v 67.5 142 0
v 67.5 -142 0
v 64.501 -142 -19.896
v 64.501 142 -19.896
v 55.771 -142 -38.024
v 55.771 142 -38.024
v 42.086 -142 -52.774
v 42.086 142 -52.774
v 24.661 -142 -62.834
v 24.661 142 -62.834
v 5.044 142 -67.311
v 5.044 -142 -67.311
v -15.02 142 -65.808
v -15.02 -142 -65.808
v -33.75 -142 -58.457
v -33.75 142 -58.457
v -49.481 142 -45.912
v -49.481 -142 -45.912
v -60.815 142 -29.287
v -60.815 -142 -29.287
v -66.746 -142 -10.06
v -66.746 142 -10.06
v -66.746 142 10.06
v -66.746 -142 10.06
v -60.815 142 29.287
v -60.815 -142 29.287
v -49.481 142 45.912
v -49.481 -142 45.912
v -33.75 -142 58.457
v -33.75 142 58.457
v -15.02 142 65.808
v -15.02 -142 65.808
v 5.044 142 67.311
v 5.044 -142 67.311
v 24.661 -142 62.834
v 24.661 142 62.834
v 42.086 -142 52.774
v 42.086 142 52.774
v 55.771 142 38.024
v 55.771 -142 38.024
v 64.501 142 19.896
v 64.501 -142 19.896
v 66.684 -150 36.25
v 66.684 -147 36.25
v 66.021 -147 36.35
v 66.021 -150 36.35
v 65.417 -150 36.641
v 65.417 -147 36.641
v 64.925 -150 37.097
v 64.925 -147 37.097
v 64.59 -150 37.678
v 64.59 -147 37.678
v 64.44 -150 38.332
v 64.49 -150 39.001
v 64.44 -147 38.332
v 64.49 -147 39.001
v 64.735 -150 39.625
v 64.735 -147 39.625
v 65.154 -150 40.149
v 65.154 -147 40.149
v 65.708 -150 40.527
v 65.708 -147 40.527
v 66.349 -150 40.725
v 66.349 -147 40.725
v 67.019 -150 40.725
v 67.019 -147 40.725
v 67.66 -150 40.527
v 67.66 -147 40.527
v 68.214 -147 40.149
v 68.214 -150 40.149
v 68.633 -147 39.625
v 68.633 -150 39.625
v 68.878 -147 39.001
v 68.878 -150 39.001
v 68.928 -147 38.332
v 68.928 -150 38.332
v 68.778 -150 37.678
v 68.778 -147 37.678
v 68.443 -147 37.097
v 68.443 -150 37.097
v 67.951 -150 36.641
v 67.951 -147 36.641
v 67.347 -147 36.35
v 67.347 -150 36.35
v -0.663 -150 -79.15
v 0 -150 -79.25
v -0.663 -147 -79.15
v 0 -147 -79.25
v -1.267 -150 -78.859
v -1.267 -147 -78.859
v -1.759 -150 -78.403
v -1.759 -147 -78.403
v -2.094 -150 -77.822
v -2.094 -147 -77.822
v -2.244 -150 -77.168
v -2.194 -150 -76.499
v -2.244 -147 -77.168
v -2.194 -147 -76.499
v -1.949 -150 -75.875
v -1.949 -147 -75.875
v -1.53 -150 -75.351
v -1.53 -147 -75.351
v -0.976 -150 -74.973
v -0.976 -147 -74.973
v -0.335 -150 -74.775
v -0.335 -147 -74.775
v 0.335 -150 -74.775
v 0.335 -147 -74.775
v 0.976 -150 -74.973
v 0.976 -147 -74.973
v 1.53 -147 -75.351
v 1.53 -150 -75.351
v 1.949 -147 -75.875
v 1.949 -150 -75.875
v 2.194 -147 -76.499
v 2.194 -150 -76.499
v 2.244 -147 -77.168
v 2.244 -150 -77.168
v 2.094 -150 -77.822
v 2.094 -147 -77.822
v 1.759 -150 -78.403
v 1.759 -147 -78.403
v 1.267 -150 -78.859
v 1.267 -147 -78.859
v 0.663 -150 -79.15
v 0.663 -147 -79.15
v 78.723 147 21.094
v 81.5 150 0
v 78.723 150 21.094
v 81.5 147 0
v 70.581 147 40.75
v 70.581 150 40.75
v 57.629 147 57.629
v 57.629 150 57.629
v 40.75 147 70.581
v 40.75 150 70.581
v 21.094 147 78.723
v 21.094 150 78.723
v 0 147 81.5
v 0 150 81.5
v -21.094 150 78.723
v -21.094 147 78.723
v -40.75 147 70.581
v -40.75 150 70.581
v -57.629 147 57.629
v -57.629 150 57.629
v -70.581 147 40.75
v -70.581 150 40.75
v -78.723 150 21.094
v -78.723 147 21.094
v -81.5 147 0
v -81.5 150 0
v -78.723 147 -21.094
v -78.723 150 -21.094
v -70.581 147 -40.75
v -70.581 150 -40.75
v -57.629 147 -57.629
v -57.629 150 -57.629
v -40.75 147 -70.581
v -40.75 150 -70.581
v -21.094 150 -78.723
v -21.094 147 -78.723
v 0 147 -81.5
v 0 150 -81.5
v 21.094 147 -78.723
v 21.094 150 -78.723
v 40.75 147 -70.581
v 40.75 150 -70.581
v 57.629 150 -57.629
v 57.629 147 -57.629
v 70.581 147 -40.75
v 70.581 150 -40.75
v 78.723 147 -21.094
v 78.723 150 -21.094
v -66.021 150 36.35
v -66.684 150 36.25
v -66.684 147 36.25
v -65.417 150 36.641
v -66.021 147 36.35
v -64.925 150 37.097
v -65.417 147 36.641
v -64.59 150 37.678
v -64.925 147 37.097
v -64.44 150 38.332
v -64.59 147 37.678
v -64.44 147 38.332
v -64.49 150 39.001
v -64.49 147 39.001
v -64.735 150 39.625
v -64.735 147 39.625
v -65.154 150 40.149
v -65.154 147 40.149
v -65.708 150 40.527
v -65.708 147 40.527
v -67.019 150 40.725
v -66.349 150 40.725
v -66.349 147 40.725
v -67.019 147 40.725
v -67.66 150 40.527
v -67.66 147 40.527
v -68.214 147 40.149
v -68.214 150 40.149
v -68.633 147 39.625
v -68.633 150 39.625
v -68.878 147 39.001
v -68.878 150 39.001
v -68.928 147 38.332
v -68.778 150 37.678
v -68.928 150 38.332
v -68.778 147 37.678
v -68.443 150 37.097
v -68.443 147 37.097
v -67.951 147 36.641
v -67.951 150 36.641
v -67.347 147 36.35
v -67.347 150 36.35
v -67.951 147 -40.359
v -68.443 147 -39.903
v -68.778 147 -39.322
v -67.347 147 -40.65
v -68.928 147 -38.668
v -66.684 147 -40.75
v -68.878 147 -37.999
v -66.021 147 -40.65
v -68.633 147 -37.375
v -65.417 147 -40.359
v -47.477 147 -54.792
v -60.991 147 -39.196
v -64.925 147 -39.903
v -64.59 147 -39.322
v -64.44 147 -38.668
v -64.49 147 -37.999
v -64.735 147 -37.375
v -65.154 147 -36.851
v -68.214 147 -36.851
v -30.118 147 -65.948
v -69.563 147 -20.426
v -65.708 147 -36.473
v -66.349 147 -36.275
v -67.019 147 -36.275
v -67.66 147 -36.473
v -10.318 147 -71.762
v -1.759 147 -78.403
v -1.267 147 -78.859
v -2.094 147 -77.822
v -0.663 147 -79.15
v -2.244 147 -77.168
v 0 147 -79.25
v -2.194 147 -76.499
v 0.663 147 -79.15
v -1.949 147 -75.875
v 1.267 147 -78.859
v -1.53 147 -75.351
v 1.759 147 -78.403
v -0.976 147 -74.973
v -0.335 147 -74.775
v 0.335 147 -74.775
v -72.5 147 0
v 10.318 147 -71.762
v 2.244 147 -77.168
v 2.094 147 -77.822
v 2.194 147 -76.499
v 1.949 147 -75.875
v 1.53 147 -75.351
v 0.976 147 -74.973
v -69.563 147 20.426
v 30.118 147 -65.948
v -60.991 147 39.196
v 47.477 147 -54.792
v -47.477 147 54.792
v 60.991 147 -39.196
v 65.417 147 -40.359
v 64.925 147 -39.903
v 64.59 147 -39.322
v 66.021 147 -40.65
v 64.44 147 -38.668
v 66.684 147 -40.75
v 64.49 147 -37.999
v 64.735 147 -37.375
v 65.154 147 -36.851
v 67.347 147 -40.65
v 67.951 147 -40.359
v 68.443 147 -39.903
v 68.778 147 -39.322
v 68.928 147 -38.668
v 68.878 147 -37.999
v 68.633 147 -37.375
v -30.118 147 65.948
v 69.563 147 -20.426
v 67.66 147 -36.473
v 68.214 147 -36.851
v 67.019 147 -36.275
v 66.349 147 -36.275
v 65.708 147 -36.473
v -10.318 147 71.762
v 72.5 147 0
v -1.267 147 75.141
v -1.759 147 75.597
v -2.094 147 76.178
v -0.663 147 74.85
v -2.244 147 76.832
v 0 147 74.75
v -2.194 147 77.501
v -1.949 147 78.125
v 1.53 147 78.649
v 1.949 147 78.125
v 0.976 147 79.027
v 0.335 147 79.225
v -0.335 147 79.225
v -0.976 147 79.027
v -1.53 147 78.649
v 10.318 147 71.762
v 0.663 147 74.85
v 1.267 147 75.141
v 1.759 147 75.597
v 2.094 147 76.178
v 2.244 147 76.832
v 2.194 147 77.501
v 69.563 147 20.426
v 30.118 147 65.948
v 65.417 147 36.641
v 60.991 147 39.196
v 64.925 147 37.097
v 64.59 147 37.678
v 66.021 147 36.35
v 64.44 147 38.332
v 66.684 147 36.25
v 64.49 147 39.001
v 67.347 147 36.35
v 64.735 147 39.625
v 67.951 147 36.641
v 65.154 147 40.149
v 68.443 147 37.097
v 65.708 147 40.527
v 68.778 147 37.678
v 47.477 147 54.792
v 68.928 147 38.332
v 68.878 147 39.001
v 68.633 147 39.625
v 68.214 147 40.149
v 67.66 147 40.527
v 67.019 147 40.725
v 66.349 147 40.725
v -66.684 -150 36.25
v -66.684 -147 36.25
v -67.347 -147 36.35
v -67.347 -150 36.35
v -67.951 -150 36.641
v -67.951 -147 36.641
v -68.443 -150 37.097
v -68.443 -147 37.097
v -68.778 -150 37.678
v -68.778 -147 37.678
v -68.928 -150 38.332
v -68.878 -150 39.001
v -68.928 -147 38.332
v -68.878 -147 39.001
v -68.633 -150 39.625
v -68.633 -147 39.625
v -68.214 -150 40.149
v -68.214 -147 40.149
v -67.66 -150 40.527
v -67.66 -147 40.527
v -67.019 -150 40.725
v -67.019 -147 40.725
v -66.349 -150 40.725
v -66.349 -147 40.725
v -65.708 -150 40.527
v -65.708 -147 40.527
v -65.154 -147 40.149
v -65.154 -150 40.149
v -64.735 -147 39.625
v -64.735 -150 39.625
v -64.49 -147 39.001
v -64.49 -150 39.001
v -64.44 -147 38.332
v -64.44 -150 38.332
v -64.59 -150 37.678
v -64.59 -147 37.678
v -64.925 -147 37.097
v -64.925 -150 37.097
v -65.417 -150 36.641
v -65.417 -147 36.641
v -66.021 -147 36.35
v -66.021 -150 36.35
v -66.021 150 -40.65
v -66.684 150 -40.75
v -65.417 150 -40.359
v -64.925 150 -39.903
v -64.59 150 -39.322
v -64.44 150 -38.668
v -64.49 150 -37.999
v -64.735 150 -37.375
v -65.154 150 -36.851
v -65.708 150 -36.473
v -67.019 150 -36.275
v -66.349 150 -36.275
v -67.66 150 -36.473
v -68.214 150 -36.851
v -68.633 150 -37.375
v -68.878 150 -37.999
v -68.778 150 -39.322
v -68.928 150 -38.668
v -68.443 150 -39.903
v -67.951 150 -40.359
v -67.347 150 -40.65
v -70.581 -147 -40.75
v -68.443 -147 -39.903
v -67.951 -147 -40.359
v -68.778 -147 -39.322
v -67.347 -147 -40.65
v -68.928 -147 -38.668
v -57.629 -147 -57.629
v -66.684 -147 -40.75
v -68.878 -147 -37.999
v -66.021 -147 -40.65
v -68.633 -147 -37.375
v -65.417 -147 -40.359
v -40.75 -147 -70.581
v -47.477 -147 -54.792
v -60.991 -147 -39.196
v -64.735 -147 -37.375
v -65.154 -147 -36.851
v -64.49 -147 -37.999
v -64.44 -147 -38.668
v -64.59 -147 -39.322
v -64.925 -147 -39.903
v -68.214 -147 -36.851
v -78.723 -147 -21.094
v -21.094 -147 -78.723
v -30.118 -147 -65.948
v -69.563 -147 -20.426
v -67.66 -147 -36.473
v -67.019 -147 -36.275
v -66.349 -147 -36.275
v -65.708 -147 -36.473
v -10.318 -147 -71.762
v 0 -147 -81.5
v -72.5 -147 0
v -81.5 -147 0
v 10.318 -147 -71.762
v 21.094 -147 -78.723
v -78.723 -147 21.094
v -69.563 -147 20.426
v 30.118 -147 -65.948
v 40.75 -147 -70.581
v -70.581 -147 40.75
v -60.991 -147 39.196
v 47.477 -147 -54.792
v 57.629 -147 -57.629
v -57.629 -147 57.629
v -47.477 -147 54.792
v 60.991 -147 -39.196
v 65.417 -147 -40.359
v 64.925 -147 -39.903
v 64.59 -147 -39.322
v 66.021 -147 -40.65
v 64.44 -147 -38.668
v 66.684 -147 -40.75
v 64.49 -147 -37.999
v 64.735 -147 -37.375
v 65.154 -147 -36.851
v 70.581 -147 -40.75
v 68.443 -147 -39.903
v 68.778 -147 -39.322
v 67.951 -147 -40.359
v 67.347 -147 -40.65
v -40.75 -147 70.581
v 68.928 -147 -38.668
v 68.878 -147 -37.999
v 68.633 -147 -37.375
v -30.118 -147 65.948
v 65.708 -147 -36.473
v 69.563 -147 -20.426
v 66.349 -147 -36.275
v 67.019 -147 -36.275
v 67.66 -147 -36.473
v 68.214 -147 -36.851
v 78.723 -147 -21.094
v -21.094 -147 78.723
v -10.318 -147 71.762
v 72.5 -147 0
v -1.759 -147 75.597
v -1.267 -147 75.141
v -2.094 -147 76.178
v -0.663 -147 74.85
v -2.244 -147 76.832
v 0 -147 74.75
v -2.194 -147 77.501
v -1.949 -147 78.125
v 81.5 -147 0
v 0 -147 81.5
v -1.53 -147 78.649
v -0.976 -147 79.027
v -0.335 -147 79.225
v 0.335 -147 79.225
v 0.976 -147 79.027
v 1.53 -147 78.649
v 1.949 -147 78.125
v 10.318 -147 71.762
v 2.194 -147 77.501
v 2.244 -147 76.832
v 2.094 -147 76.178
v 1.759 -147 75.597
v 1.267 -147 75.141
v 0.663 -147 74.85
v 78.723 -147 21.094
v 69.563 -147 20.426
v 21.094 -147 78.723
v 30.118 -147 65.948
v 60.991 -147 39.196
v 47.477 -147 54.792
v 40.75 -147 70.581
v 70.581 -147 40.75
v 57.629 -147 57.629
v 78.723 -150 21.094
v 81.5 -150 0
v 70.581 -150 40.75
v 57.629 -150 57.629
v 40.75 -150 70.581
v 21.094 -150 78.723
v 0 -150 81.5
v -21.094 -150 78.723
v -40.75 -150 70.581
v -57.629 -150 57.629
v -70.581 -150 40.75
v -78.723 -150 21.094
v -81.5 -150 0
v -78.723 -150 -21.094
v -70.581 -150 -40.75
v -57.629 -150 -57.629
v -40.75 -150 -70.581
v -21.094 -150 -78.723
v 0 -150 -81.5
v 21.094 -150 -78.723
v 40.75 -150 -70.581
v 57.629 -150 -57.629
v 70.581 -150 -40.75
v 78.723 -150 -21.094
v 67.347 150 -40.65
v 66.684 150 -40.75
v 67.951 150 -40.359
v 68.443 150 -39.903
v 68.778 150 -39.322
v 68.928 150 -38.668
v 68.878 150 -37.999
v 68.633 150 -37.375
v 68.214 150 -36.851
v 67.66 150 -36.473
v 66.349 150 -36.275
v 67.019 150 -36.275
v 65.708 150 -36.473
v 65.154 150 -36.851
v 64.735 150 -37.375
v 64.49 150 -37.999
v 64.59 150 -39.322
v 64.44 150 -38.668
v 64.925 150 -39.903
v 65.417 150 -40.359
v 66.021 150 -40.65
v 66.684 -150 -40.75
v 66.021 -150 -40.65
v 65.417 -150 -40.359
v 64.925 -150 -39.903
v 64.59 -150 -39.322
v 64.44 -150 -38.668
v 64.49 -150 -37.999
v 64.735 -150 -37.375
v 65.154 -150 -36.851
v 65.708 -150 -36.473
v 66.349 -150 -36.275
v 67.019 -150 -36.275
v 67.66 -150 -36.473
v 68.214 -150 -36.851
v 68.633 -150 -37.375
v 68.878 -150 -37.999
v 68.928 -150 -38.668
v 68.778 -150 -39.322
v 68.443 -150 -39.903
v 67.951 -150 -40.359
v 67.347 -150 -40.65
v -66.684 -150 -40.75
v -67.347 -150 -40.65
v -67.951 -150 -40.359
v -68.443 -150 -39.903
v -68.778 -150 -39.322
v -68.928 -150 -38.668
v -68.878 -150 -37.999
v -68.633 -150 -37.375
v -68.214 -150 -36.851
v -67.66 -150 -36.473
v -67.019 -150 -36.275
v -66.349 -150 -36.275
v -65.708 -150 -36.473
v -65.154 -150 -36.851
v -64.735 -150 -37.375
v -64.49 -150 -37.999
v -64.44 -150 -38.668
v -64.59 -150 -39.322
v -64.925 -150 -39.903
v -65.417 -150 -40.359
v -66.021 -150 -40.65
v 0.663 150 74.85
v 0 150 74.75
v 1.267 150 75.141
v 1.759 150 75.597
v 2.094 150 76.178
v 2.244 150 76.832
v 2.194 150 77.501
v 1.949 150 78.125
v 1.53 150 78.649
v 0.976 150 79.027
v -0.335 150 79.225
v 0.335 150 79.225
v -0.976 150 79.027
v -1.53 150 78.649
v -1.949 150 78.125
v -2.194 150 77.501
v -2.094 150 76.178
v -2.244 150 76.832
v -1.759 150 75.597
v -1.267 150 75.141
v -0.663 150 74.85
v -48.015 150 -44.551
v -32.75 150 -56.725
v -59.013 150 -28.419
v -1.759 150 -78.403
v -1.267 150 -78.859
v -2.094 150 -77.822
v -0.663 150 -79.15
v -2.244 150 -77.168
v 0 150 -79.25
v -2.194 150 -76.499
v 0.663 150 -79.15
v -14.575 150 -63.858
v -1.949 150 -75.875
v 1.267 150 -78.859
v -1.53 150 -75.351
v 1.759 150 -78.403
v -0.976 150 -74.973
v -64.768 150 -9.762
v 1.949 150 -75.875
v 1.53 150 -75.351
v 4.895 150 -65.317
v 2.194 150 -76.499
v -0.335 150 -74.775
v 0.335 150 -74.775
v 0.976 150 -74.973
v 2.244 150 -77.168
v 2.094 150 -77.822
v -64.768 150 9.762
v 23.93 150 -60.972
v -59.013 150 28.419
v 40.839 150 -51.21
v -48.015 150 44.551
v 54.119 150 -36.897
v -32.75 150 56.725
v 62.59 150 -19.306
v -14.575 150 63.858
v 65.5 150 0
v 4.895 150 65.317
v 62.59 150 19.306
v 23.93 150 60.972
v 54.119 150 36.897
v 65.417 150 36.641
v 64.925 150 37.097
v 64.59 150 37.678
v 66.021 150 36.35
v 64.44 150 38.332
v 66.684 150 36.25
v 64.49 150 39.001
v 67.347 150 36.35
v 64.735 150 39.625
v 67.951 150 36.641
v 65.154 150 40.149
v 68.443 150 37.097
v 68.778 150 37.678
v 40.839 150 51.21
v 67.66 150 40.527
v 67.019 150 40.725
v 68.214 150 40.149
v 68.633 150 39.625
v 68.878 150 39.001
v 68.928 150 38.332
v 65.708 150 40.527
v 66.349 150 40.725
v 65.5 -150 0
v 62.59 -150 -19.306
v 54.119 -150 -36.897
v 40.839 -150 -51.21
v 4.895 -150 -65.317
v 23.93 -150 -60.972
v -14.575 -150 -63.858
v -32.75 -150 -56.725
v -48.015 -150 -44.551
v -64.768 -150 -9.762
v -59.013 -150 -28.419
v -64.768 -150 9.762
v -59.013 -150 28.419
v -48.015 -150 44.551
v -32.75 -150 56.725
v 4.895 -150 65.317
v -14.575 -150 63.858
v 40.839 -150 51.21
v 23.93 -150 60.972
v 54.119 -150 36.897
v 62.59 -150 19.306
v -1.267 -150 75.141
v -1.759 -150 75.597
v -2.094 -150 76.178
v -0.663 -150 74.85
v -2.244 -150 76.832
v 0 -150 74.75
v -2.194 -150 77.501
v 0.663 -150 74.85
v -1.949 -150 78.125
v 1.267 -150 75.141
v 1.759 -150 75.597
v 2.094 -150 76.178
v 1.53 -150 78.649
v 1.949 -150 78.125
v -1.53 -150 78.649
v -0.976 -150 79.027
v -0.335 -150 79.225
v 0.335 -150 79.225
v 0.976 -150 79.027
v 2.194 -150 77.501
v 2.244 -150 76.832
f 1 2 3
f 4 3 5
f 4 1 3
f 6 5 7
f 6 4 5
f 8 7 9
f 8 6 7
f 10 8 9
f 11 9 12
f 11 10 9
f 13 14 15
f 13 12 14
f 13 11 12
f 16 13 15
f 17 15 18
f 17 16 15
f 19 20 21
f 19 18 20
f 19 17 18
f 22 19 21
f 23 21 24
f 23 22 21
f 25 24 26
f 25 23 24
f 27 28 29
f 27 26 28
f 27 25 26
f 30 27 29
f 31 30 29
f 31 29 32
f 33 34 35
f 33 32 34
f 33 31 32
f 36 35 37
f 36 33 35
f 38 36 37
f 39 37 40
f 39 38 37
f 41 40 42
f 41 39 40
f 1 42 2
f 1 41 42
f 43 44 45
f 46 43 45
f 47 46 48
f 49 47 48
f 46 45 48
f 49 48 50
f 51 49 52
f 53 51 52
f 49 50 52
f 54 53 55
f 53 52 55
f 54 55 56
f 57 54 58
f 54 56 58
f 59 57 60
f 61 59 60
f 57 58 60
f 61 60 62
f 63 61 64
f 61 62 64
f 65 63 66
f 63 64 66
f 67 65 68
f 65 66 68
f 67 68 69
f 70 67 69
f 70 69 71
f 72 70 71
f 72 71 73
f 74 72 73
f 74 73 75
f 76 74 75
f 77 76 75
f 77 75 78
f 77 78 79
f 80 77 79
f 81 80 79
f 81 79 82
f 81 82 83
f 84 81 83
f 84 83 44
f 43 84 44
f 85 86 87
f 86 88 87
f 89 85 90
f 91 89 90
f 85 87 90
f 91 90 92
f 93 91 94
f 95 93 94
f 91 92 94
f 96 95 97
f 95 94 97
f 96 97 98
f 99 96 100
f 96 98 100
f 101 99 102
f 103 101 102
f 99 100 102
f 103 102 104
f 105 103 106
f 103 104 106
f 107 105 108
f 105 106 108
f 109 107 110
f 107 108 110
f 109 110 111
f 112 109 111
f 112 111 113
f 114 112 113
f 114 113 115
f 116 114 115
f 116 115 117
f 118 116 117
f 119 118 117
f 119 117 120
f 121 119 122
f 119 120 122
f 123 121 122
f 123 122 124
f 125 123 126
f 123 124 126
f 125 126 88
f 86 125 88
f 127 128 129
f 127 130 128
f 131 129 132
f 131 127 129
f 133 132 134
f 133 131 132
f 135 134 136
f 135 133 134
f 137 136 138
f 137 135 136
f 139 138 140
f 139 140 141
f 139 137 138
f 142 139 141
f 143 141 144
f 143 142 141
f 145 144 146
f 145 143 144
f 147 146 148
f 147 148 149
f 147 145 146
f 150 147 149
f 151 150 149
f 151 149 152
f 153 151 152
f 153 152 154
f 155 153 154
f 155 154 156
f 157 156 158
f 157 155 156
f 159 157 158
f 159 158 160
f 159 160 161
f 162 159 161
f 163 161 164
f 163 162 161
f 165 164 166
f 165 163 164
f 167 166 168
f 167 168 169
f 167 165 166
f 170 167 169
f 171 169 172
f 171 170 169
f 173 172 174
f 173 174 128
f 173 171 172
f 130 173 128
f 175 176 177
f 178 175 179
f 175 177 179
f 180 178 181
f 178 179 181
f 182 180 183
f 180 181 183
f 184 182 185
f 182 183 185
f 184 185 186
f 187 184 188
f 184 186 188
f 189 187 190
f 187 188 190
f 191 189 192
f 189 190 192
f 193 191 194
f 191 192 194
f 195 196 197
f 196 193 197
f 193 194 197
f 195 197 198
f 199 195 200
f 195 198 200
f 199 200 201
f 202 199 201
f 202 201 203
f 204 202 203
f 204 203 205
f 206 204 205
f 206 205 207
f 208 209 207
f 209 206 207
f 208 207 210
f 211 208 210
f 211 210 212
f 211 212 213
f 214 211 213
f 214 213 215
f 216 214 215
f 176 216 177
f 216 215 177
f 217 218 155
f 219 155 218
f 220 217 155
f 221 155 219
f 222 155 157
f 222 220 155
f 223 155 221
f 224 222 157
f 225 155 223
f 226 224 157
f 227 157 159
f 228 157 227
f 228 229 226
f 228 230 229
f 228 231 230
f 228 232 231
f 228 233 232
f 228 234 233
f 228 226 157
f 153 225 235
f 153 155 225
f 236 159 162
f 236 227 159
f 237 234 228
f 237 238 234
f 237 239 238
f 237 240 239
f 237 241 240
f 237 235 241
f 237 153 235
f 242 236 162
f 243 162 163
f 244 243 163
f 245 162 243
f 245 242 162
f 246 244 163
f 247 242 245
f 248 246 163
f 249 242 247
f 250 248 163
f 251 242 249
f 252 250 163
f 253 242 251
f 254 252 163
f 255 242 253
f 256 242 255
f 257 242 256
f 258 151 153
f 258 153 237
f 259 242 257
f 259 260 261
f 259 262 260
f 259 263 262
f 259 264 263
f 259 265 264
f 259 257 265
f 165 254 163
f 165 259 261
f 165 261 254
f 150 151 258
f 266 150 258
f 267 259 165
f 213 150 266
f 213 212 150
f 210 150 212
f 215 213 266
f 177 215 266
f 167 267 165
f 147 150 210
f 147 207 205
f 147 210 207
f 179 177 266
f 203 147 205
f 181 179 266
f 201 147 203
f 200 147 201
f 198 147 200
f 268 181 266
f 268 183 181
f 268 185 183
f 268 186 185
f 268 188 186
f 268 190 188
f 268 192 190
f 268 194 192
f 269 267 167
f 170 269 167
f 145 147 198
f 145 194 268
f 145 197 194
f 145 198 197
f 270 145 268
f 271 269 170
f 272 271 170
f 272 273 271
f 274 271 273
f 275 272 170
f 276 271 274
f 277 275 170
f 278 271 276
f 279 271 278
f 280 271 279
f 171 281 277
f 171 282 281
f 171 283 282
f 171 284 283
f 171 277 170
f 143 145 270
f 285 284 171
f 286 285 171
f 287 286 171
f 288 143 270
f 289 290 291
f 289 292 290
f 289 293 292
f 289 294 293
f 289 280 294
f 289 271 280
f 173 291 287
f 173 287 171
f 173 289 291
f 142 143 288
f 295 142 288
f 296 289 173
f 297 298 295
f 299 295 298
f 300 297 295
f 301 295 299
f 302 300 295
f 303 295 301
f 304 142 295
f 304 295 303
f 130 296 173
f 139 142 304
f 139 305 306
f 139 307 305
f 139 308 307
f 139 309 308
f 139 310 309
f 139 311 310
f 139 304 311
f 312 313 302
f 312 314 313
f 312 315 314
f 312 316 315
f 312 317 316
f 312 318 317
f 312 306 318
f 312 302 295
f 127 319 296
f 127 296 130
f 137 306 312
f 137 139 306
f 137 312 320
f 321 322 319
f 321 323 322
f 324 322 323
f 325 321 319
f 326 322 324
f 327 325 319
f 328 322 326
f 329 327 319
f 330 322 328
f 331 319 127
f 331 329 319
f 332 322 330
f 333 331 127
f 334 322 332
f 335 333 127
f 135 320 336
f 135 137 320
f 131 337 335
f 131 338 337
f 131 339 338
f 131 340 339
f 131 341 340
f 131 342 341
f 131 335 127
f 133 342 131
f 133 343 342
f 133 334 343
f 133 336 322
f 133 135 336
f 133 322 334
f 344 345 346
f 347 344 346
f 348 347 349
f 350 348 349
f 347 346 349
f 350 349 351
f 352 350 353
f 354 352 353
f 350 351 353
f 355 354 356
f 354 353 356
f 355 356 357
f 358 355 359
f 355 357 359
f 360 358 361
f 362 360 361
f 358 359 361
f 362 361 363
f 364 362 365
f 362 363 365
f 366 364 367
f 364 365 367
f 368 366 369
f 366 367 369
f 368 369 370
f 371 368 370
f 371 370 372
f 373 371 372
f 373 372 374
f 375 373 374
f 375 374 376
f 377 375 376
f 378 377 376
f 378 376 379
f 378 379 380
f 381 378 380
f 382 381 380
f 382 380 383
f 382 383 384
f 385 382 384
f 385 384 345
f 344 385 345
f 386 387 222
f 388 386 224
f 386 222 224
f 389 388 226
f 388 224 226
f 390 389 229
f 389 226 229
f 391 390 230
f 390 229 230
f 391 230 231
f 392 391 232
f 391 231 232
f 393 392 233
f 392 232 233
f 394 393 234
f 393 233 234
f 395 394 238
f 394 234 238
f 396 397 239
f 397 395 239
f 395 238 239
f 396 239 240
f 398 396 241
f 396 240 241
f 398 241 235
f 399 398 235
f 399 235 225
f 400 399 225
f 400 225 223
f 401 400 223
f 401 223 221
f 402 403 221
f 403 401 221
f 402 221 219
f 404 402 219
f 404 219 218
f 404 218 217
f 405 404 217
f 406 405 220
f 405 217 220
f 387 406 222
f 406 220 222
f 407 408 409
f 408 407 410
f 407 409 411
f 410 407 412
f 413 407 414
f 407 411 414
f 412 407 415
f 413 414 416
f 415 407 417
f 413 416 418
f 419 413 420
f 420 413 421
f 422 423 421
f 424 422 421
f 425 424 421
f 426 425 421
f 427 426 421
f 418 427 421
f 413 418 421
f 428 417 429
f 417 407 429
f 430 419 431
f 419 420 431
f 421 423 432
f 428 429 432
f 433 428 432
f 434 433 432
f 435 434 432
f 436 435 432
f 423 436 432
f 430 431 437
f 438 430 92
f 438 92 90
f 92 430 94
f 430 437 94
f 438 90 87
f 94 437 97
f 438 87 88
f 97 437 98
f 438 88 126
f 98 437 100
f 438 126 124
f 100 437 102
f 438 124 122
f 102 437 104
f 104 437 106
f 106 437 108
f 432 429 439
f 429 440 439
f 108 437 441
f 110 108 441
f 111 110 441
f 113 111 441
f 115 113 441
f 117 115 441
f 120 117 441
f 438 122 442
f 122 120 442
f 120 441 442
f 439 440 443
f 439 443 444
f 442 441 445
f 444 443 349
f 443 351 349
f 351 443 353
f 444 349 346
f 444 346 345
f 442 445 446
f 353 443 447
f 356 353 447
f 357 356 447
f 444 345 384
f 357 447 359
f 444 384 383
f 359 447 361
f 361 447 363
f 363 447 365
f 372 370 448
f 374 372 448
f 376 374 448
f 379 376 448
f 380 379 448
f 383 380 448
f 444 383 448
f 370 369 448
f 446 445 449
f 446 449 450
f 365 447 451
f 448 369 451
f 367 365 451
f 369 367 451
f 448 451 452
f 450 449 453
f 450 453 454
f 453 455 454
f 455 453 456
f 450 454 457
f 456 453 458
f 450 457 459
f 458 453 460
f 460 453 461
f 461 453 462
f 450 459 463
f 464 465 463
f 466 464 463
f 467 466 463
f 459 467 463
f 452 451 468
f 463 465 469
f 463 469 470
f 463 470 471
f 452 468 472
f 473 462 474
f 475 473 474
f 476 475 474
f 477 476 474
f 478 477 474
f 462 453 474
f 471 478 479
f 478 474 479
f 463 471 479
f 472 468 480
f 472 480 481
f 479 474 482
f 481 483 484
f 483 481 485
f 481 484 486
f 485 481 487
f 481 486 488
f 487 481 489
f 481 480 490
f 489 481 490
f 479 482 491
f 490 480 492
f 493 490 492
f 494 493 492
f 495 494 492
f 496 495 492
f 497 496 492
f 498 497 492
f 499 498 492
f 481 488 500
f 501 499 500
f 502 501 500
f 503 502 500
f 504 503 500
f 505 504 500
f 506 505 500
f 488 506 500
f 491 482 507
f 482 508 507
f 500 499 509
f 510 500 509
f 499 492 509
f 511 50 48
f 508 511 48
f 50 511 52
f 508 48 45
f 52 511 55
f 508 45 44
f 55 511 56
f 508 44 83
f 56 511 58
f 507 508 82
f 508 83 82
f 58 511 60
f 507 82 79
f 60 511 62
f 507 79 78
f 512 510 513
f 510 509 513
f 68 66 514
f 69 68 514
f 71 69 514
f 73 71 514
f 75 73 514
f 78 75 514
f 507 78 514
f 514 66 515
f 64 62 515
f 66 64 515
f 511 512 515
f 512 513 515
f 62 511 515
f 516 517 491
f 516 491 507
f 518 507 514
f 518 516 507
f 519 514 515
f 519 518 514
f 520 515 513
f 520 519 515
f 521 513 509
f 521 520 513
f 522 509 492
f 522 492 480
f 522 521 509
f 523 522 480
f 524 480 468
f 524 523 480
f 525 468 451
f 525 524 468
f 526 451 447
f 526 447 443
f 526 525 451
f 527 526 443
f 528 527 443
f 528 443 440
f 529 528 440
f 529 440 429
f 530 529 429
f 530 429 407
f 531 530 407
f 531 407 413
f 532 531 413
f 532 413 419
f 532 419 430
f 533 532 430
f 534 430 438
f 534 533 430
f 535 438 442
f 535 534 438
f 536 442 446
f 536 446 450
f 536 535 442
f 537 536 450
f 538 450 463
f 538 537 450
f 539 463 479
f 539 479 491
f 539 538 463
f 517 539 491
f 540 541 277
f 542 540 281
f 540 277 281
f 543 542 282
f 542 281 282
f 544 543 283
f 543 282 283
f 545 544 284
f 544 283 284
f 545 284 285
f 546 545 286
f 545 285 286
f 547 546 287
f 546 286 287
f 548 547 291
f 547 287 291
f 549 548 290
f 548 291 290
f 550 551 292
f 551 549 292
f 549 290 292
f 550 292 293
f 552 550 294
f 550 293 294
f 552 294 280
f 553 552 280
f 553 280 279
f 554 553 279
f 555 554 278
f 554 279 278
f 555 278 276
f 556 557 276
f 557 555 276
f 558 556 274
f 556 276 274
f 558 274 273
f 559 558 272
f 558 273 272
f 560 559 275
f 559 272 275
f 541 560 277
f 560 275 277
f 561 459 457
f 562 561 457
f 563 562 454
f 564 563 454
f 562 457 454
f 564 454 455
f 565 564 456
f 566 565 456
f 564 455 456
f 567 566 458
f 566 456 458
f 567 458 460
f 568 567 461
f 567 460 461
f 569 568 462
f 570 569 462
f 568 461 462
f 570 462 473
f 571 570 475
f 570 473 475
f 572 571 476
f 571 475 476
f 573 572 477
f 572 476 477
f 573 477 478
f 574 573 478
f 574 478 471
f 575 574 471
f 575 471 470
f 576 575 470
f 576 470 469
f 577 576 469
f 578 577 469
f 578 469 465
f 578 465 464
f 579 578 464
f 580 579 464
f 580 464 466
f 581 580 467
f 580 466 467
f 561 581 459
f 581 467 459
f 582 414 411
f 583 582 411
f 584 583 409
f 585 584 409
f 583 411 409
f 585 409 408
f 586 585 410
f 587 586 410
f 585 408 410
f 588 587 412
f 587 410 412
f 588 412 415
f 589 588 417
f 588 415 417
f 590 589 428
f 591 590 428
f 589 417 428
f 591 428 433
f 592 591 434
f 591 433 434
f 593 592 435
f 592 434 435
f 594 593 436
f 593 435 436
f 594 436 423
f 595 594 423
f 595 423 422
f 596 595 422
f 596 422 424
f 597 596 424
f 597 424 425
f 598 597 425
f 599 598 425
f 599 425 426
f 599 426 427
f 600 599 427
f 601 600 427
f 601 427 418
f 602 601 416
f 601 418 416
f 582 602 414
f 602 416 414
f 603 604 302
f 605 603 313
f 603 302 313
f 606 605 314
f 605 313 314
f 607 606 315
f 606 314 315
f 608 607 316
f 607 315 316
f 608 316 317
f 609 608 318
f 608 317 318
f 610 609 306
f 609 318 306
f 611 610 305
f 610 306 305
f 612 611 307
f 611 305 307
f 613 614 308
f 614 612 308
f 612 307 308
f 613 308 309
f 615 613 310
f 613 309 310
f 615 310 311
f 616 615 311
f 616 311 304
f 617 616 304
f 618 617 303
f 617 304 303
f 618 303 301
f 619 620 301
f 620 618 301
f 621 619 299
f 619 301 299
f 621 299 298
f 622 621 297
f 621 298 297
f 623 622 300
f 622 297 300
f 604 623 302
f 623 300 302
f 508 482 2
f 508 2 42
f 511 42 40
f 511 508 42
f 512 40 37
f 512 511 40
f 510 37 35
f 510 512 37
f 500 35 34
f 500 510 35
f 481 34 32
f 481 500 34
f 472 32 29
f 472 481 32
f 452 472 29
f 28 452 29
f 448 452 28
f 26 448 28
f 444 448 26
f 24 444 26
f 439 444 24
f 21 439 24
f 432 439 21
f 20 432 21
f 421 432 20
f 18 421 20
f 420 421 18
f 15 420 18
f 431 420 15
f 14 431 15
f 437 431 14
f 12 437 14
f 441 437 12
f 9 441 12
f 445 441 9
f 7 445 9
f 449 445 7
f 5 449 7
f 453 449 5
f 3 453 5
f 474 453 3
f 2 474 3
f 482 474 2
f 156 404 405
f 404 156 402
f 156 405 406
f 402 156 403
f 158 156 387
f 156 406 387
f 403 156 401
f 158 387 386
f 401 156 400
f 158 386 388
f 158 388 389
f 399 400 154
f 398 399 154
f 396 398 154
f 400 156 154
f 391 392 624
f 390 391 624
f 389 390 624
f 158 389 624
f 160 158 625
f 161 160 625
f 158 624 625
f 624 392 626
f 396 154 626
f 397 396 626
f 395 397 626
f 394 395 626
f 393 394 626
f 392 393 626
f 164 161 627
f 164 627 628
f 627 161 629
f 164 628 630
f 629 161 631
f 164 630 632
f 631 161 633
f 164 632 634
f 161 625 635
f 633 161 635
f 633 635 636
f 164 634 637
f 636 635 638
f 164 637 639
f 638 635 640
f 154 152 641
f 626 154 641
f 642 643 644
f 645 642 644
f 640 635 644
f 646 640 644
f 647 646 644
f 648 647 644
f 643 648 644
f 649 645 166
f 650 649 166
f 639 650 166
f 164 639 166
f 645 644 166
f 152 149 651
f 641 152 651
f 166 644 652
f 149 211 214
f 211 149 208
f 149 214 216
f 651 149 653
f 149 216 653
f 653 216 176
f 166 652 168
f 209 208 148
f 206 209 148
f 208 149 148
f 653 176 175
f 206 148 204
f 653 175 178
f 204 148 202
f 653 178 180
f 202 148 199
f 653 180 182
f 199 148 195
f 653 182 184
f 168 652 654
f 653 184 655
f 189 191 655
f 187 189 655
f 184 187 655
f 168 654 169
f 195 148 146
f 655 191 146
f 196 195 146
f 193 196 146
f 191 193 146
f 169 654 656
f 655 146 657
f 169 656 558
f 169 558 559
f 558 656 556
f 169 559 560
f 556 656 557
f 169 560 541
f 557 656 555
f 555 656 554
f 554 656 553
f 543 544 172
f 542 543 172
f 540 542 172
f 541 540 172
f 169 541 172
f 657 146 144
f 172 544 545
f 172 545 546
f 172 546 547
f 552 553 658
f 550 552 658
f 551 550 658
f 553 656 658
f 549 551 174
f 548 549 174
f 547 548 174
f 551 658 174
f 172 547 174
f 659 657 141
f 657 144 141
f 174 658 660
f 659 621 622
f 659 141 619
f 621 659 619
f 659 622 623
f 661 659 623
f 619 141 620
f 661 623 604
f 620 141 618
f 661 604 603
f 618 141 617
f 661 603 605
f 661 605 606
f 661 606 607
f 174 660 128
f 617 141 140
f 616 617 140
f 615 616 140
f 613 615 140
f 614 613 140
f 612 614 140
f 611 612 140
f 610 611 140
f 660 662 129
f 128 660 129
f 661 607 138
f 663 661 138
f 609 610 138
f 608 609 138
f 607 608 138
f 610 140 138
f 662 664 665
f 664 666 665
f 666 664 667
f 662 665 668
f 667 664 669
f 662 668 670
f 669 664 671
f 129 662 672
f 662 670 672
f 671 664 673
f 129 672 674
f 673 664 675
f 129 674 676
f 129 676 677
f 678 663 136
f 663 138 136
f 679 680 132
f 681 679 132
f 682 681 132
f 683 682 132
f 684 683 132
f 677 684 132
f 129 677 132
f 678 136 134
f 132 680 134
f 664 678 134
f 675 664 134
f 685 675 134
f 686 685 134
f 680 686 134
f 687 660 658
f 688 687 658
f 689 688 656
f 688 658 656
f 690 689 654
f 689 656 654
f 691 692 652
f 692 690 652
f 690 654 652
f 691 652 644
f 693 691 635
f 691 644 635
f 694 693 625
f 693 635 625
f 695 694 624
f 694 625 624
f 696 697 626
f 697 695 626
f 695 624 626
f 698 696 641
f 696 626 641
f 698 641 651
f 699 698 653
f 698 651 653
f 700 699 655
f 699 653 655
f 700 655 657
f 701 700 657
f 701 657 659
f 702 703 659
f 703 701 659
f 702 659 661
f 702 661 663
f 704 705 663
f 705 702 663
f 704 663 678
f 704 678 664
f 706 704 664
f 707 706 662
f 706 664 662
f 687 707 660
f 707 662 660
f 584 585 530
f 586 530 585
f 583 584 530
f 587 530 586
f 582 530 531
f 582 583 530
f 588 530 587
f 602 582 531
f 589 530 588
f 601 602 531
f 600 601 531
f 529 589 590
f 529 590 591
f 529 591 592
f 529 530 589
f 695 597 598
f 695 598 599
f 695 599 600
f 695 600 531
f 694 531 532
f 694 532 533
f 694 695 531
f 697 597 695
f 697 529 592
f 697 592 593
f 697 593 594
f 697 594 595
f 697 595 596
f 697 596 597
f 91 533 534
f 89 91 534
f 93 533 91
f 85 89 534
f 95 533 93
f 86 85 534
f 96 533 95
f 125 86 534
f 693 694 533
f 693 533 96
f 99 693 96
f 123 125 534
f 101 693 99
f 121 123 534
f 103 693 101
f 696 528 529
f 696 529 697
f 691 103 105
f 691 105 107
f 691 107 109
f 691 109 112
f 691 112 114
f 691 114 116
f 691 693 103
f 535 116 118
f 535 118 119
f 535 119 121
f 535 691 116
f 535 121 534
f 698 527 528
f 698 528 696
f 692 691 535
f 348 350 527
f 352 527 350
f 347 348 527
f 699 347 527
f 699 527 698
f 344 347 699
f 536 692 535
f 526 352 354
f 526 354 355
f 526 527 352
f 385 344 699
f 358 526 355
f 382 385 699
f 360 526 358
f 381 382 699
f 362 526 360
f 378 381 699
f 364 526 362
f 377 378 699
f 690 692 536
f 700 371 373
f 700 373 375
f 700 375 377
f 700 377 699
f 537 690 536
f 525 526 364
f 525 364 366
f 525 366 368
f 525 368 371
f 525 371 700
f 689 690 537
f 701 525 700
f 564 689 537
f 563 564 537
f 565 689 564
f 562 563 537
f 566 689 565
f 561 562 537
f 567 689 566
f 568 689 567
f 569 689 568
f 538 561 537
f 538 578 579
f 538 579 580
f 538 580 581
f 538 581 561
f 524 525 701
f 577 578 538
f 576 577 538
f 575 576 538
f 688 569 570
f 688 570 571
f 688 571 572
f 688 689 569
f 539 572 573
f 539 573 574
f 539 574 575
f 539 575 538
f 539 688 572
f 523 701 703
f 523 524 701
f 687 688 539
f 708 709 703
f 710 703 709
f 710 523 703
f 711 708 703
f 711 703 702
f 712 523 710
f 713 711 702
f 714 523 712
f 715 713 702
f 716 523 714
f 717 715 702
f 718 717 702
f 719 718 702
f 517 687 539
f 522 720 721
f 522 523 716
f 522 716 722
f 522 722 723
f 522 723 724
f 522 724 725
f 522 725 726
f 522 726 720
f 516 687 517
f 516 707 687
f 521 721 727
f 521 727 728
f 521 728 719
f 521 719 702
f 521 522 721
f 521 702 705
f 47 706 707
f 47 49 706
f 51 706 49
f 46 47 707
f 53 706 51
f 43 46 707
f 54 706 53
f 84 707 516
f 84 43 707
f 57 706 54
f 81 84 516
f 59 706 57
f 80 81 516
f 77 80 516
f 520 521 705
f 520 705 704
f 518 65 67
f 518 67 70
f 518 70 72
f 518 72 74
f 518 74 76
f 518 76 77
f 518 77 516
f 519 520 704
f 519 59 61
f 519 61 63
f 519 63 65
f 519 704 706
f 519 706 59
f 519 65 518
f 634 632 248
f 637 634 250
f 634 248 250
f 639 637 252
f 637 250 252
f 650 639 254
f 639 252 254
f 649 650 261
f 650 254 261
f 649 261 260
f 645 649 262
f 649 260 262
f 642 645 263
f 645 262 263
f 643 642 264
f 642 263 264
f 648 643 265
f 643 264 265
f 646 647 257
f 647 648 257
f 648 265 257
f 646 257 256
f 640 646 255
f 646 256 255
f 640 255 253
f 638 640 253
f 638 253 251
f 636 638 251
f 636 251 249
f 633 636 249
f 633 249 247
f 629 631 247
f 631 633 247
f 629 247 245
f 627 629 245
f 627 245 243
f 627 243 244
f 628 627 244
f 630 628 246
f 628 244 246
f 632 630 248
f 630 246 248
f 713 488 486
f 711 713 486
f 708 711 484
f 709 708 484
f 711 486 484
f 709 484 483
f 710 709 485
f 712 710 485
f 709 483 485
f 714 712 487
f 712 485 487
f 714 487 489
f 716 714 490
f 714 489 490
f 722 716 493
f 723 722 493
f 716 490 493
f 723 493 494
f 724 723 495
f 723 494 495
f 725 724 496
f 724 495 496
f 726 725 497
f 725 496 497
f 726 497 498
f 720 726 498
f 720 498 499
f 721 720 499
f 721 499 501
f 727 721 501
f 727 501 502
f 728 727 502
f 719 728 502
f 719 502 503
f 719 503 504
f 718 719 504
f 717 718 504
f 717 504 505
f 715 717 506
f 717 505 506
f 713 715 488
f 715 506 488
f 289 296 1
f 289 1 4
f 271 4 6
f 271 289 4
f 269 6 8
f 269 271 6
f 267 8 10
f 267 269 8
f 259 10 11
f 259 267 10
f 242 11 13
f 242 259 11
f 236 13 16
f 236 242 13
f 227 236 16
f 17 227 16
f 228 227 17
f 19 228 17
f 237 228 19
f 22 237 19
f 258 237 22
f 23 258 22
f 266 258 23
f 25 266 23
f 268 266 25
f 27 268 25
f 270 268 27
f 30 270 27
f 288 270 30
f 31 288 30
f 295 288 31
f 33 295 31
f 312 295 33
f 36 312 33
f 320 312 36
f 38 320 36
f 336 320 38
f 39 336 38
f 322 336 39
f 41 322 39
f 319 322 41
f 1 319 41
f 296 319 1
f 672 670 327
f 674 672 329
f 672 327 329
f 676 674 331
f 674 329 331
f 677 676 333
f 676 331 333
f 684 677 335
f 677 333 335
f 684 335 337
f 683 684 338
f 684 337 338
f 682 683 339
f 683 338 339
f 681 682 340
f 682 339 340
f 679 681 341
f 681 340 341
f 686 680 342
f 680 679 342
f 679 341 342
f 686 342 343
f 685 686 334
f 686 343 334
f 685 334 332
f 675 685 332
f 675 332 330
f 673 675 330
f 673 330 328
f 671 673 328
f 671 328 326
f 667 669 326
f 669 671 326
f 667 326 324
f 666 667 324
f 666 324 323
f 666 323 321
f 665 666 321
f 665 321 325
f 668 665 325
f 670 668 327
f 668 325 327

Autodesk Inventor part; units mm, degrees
ref_plane "YZ Plane" through (0, 0, 0) normal (1, 0, 0) x (0, 1, 0)
ref_plane "XZ Plane" through (0, 0, 0) normal (0, 1, 0) x (-1, 0, 0)
ref_plane "XY Plane" through (0, 0, 0) normal (0, 0, 1) x (1, 0, 0)
sketch "Sketch1" plane through (0, 0, 0) normal (0, 0, 1) x (1, 0, 0)
  line L0 (-16.3, 0) -> (97.8, 0) construction
  line L1 (0, 210) -> (0, -210) construction
  line L2 (65.5, -150) -> (65.5, 150)
  line L3 (65.5, 150) -> (67.5, 150)
  line L4 (81.5, -147) -> (81.5, -150)
  line L5 (81.5, -150) -> (65.5, -150)
  line L6 (67.5, -142) -> (67.5, 142)
  line L7 (81.5, -147) -> (72.5, -147)
  line L8 (72.5, -147) -> (67.5, -142)
  line L9 (81.5, 150) -> (65.5, 150)
  line L10 (81.5, 150) -> (81.5, 147)
  line L11 (81.5, 147) -> (72.5, 147)
  line L12 (72.5, 147) -> (67.5, 142)
  point P0 (0, 0)
  dimension "d0" = 300
  dimension "d5" = 81.5
  dimension "d6" = 2
  dimension "d7" = 9
  dimension "d8" = 5
  dimension "d9" = 45
  dimension "d10" = 16
  dimension "d11" = 3
  dimension "d12" = 3
  dimension "d13" = 9
  dimension "d14" = 45
  dimension "d15" = 5
revolve "Revolution1" add sketch "Sketch1" angle 360 about axis through (0, 0, 0) along (0, -1, 0)
sketch "Sketch2" plane through (0, -150, 0) normal (0, -1, 0) x (1, 0, 0)
  line L0 (0, 114.1) -> (0, -114.1) construction
  line L1 (-114.1, 0) -> (114.1, 0) construction
  circle A0 centre (0, 0) radius 81.5 construction
  circle A1 centre (0, 0) radius 65.5 construction
  circle A2 centre (0, 0) radius 77 construction
  circle A3 centre (0, 0) radius 72.5 construction
  point P0 (0, 77)
  point P1 (-66.684, 38.5)
  point P2 (-66.684, -38.5)
  point P3 (0, -77)
  point P4 (66.684, -38.5)
  point P5 (66.684, 38.5)
  dimension "d16" = 4.5
  dimension "d20" = 360
  dimension "d29" = 4.5
hole "Hole1" at (0, -150, 77) at (-66.684, -150, 38.5) at (-66.684, -150, -38.5) at (0, -150, -77) at (66.684, -150, -38.5) at (66.684, -150, 38.5) direction (0, 1, 0) diameter 4.5 depth 13 tip angle 118 clearance for "Flat Head Machine Screw" size "M4" standard "Ansi Metric M Profile"
mirror "Mirror1" about plane through (0, 0, 0) normal (0, 1, 0) of "Hole1"
equation "\"d16\" = d29"
equation "\"d12\" = d11"
equation "\"d13\" = d7"
equation "\"d14\" = d9"
equation "\"d15\" = d8"
properties part number "Link_2" material "Aluminum 6061"
